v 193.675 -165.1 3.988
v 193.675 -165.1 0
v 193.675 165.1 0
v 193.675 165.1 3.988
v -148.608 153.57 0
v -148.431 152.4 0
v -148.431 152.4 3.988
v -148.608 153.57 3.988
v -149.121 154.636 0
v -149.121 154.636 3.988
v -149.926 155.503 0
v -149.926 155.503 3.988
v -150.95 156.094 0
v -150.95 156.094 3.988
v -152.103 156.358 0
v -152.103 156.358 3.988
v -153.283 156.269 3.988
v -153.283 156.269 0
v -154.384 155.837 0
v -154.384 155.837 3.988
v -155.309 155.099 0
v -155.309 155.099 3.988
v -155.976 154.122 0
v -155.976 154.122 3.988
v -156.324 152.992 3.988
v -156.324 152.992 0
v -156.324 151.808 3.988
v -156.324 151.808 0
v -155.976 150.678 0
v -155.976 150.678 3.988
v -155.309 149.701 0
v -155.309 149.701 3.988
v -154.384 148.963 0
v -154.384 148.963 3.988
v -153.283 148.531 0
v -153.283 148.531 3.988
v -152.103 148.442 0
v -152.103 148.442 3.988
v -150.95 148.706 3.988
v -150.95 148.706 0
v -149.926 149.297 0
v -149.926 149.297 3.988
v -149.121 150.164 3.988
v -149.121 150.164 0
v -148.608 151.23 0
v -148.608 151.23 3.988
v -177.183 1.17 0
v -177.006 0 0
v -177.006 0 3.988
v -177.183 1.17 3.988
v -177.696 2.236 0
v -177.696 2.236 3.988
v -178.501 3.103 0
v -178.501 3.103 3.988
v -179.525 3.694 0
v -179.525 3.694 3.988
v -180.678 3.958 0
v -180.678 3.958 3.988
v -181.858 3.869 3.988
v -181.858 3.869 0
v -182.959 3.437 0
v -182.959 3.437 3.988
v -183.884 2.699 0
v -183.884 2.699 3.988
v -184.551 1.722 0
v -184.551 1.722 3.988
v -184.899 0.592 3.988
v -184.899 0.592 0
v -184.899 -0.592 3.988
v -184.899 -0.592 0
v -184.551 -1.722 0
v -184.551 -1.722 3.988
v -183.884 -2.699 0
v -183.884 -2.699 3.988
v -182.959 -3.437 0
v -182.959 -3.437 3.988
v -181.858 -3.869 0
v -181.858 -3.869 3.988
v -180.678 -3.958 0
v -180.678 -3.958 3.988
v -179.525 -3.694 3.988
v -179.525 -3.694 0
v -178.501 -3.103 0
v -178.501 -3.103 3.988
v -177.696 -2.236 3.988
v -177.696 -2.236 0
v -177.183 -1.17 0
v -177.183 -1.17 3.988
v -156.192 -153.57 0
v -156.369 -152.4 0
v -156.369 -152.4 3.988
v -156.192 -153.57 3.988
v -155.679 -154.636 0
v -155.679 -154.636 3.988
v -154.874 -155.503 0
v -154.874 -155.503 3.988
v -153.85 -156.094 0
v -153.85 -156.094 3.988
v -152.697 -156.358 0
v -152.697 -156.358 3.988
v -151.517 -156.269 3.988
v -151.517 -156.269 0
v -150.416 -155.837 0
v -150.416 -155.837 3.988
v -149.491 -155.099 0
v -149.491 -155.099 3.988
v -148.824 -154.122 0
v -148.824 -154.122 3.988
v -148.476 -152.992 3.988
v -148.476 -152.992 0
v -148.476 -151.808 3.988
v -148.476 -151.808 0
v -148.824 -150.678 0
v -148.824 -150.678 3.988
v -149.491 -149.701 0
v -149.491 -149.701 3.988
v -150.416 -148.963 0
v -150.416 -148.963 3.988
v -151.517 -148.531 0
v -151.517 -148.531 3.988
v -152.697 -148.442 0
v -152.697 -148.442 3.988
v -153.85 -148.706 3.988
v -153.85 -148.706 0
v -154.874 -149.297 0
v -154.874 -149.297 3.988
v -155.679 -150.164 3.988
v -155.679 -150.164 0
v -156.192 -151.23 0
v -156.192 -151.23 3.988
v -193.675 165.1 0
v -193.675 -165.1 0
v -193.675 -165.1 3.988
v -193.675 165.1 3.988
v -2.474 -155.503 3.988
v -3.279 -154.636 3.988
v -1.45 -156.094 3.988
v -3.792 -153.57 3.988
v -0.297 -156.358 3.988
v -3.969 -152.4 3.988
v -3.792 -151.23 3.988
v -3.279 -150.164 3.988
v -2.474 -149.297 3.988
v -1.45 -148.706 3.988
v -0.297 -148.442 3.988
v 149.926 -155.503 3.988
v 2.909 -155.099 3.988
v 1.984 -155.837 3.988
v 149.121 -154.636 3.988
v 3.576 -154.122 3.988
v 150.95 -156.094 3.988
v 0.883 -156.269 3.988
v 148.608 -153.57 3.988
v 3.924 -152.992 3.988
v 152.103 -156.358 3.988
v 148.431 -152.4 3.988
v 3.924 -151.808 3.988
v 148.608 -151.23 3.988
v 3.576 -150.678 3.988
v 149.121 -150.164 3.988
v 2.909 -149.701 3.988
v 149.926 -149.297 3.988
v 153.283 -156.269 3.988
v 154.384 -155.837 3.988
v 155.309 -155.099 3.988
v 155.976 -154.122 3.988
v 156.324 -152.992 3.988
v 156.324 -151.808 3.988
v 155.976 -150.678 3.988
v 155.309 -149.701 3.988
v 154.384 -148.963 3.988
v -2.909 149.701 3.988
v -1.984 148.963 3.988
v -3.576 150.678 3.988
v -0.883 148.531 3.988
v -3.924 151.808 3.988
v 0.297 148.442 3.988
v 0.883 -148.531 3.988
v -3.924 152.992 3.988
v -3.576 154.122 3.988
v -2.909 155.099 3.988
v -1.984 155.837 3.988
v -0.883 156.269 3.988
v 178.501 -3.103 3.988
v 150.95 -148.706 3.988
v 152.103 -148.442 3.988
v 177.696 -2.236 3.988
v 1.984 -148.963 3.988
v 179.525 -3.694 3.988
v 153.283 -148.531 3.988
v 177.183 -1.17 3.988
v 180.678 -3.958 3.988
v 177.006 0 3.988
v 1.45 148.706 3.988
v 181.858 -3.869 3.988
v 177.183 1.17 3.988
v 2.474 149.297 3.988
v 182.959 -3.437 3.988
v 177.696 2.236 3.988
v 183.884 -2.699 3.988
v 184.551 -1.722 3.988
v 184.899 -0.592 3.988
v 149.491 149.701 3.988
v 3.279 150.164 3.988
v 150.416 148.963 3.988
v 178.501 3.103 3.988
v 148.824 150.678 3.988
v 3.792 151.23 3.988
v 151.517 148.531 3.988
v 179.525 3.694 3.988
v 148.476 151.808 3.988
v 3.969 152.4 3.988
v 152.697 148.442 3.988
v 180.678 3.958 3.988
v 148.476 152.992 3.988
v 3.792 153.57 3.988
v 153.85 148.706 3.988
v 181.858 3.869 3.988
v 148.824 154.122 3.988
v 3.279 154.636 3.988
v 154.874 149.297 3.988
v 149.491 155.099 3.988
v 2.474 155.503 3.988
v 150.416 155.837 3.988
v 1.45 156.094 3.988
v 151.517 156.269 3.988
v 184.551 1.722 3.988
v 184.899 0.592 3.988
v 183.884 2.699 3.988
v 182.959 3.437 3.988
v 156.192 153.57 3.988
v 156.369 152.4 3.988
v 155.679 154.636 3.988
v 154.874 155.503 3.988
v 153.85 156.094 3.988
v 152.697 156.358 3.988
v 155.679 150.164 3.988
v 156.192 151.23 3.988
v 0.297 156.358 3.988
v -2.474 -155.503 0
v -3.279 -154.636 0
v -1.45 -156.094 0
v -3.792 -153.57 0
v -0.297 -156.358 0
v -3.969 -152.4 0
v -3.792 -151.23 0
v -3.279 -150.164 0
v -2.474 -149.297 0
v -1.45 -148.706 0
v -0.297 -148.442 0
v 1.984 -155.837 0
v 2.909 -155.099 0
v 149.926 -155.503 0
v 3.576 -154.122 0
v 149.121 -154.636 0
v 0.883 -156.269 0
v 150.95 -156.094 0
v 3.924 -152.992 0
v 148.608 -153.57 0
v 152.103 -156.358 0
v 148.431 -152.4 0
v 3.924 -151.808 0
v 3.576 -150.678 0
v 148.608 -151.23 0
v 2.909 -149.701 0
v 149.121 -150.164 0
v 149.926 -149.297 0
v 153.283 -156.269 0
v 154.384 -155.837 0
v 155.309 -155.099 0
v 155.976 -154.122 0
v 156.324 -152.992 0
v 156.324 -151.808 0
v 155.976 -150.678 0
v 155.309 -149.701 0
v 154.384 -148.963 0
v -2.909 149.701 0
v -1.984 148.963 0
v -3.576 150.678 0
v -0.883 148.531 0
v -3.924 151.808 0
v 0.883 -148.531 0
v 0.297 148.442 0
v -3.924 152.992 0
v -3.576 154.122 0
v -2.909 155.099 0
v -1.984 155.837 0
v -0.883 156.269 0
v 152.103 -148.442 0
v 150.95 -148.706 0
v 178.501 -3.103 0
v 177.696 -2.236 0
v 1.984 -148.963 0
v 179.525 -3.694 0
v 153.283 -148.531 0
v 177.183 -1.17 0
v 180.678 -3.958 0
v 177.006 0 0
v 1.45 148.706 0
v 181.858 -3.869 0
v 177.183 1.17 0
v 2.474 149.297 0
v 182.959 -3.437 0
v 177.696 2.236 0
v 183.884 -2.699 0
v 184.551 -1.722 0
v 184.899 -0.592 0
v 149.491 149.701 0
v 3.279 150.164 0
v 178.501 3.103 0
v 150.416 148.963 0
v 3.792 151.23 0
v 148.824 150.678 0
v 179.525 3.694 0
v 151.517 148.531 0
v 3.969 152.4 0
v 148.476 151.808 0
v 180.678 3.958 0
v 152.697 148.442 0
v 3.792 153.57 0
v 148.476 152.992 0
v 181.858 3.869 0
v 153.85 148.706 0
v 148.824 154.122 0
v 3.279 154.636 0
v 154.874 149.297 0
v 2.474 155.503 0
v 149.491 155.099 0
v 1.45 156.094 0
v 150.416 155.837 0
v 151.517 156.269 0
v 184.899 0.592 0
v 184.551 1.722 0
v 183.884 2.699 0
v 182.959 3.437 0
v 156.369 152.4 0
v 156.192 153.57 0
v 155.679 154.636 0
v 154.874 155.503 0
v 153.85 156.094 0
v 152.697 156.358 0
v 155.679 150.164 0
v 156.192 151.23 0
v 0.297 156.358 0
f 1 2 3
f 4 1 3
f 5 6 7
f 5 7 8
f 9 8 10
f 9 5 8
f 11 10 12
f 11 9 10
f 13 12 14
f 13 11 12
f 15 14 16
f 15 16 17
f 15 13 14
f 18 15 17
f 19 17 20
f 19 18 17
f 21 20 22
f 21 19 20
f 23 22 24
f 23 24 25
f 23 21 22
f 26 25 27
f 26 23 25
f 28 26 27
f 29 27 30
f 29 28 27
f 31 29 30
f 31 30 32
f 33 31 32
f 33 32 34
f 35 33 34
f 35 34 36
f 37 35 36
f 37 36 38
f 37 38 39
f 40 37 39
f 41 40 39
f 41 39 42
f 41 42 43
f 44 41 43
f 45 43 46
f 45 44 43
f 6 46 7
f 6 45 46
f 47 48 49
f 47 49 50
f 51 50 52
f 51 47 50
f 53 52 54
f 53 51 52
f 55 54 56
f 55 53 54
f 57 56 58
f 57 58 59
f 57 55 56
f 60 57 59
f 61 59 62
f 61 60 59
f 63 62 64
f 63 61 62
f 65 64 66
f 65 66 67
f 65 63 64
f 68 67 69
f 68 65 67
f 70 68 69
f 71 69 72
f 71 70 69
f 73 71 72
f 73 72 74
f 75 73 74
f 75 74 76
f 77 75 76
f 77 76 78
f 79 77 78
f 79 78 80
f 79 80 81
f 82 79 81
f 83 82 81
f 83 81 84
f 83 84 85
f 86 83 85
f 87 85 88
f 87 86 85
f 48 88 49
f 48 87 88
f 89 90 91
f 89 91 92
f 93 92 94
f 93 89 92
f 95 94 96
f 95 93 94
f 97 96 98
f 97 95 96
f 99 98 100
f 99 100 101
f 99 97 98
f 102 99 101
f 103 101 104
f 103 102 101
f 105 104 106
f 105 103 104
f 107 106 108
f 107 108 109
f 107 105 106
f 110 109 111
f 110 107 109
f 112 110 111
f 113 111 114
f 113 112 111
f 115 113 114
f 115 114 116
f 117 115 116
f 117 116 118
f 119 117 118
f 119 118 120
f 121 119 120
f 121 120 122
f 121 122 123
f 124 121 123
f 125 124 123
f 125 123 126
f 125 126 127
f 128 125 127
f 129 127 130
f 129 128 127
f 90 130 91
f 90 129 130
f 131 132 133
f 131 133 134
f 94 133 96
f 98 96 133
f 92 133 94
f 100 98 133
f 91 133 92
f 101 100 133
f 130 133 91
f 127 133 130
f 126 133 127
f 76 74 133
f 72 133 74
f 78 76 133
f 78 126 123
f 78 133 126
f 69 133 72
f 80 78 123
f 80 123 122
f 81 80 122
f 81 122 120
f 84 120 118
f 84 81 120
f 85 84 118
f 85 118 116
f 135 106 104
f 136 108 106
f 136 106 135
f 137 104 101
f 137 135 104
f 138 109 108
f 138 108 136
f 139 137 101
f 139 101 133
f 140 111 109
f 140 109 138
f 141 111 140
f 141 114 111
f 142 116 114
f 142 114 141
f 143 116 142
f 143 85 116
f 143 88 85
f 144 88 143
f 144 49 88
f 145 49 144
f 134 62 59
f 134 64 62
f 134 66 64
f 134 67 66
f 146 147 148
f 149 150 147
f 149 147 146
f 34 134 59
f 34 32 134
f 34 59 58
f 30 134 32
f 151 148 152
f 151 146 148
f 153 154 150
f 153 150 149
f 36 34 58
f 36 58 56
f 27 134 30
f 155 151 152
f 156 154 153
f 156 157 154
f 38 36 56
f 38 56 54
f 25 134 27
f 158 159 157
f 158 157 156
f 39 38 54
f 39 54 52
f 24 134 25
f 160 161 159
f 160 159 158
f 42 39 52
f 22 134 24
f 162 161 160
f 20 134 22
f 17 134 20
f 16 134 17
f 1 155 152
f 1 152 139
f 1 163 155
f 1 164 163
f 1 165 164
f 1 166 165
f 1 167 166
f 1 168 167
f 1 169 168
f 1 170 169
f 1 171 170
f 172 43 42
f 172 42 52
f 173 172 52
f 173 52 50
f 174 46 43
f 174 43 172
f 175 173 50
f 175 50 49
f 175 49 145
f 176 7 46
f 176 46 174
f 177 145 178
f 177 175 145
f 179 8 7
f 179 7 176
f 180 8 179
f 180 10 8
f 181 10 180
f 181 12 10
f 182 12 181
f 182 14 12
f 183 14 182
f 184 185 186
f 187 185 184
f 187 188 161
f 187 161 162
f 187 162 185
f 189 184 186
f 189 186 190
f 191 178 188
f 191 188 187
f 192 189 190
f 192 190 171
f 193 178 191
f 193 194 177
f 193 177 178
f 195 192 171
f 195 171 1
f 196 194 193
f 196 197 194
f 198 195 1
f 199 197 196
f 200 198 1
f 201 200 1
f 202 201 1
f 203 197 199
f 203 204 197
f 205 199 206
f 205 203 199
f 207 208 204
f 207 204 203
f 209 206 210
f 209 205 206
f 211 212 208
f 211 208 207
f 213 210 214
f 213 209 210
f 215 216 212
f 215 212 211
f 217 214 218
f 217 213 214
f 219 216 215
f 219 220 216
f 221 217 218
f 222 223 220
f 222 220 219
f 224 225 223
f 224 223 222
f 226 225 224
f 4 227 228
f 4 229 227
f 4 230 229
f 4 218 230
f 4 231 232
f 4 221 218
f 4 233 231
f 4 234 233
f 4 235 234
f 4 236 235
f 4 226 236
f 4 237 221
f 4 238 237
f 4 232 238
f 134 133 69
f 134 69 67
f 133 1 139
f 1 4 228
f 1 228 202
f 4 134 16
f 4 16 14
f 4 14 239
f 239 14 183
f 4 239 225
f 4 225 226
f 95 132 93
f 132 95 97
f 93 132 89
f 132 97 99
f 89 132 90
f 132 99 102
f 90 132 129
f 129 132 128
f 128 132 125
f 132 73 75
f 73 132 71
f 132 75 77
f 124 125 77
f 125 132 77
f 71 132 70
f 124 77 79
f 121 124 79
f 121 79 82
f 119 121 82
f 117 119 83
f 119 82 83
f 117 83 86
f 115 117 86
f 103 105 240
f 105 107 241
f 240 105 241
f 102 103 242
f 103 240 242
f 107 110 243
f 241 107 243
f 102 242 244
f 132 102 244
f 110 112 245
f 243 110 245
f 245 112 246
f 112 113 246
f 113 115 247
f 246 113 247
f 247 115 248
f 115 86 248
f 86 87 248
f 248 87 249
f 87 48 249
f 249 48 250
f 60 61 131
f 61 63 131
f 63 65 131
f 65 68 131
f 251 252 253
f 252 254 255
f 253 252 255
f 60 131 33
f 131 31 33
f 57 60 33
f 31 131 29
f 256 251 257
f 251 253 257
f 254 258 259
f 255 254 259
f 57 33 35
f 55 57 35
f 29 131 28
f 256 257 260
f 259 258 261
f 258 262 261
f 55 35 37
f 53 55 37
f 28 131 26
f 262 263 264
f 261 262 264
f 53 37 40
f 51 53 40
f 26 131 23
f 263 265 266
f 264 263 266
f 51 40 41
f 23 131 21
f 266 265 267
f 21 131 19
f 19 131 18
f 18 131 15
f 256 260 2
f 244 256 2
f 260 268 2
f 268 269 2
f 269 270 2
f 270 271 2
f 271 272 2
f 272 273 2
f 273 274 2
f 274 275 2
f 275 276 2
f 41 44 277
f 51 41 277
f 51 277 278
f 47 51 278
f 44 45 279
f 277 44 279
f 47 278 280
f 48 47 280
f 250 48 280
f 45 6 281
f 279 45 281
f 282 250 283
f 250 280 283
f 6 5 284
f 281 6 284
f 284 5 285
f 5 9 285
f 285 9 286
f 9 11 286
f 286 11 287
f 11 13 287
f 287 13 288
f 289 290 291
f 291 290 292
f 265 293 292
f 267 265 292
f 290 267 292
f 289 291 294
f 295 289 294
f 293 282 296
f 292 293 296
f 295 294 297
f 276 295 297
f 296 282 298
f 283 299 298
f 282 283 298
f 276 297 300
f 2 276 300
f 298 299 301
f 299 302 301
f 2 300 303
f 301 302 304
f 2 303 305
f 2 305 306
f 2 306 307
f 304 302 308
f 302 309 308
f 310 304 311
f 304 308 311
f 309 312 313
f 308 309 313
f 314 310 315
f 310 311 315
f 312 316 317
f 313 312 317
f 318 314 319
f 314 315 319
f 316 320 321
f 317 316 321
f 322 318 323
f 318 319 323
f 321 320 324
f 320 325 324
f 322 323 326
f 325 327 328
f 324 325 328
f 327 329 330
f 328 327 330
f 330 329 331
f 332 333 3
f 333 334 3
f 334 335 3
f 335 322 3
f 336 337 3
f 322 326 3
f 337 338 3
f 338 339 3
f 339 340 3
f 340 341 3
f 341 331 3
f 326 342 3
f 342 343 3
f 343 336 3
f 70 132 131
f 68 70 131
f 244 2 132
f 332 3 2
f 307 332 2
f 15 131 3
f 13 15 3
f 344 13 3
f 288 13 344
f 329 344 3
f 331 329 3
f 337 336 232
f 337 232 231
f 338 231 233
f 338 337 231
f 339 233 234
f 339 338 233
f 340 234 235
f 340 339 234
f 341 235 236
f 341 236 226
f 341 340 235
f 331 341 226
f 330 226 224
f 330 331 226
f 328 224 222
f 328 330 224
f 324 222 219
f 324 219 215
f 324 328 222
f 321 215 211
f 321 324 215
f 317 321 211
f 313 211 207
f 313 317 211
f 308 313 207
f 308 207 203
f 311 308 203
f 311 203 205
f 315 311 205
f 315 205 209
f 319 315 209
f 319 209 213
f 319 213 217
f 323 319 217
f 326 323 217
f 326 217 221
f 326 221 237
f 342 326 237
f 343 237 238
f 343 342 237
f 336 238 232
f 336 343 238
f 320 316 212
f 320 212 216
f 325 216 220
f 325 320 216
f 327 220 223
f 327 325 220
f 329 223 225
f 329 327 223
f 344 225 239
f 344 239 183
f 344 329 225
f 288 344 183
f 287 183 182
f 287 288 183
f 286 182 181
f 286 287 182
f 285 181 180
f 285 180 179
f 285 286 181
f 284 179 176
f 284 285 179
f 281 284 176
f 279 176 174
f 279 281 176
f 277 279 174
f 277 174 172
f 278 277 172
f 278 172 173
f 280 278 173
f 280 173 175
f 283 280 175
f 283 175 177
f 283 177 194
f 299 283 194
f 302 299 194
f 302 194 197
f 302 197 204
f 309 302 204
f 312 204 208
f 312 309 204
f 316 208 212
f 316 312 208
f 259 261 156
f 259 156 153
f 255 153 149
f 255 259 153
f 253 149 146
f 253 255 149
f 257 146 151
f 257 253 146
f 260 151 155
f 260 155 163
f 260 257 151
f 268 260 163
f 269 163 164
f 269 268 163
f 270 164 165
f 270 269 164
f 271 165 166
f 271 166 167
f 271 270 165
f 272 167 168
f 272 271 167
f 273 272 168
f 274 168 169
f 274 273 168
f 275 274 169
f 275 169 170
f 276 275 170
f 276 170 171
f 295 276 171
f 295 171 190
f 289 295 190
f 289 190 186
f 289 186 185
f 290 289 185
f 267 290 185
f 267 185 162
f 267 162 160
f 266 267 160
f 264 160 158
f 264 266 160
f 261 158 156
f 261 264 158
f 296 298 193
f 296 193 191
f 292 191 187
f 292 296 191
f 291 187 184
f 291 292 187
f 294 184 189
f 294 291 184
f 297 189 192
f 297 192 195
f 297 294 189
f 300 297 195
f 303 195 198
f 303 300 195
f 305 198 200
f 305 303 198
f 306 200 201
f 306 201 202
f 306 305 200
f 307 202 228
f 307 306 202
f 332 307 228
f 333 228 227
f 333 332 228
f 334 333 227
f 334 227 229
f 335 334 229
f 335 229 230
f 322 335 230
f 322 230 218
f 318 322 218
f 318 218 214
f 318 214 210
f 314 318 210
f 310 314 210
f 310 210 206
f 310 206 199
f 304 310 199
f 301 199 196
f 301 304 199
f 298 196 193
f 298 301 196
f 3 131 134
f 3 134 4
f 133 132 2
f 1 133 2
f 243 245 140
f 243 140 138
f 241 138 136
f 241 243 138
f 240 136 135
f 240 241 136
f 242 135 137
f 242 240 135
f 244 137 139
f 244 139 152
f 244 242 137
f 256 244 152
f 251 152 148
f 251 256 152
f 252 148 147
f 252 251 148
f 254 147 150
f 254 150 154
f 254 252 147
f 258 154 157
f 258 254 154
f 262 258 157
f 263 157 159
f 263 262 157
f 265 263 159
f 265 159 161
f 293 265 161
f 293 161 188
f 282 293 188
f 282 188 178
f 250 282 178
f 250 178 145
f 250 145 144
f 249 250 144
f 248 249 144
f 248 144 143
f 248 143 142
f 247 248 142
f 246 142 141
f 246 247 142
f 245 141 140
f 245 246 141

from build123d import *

# Parameters (mm, degrees)
SKETCH1_W           = 387.35
SKETCH1_H           = 330.2
SKETCH1_R           = 3.96875
BOSS_EXTRUDE1_DEPTH = 3.9878


with BuildPart() as part:
    # Sketch1 → Boss-Extrude1 (new body)
    with BuildSketch(Plane.XY):
        Rectangle(SKETCH1_W, SKETCH1_H)
        with Locations((-180.975, 0)):
            Circle(SKETCH1_R, mode=Mode.SUBTRACT)
        with Locations((0, 152.4)):
            Circle(SKETCH1_R, mode=Mode.SUBTRACT)
        with Locations((152.4, 152.4)):
            Circle(SKETCH1_R, mode=Mode.SUBTRACT)
        with Locations((-152.4, 152.4)):
            Circle(SKETCH1_R, mode=Mode.SUBTRACT)
        with Locations(Location((180.975, 0, 0), (0, 0, 180))):
            Circle(SKETCH1_R, mode=Mode.SUBTRACT)
        with Locations(Location((152.4, -152.4, 0), (0, 0, 180))):
            Circle(SKETCH1_R, mode=Mode.SUBTRACT)
        with Locations(Location((0, -152.4, 0), (0, 0, 180))):
            Circle(SKETCH1_R, mode=Mode.SUBTRACT)
        with Locations(Location((-152.4, -152.4, 0), (0, 0, 180))):
            Circle(SKETCH1_R, mode=Mode.SUBTRACT)
    extrude(amount=BOSS_EXTRUDE1_DEPTH)


solid = part.part
